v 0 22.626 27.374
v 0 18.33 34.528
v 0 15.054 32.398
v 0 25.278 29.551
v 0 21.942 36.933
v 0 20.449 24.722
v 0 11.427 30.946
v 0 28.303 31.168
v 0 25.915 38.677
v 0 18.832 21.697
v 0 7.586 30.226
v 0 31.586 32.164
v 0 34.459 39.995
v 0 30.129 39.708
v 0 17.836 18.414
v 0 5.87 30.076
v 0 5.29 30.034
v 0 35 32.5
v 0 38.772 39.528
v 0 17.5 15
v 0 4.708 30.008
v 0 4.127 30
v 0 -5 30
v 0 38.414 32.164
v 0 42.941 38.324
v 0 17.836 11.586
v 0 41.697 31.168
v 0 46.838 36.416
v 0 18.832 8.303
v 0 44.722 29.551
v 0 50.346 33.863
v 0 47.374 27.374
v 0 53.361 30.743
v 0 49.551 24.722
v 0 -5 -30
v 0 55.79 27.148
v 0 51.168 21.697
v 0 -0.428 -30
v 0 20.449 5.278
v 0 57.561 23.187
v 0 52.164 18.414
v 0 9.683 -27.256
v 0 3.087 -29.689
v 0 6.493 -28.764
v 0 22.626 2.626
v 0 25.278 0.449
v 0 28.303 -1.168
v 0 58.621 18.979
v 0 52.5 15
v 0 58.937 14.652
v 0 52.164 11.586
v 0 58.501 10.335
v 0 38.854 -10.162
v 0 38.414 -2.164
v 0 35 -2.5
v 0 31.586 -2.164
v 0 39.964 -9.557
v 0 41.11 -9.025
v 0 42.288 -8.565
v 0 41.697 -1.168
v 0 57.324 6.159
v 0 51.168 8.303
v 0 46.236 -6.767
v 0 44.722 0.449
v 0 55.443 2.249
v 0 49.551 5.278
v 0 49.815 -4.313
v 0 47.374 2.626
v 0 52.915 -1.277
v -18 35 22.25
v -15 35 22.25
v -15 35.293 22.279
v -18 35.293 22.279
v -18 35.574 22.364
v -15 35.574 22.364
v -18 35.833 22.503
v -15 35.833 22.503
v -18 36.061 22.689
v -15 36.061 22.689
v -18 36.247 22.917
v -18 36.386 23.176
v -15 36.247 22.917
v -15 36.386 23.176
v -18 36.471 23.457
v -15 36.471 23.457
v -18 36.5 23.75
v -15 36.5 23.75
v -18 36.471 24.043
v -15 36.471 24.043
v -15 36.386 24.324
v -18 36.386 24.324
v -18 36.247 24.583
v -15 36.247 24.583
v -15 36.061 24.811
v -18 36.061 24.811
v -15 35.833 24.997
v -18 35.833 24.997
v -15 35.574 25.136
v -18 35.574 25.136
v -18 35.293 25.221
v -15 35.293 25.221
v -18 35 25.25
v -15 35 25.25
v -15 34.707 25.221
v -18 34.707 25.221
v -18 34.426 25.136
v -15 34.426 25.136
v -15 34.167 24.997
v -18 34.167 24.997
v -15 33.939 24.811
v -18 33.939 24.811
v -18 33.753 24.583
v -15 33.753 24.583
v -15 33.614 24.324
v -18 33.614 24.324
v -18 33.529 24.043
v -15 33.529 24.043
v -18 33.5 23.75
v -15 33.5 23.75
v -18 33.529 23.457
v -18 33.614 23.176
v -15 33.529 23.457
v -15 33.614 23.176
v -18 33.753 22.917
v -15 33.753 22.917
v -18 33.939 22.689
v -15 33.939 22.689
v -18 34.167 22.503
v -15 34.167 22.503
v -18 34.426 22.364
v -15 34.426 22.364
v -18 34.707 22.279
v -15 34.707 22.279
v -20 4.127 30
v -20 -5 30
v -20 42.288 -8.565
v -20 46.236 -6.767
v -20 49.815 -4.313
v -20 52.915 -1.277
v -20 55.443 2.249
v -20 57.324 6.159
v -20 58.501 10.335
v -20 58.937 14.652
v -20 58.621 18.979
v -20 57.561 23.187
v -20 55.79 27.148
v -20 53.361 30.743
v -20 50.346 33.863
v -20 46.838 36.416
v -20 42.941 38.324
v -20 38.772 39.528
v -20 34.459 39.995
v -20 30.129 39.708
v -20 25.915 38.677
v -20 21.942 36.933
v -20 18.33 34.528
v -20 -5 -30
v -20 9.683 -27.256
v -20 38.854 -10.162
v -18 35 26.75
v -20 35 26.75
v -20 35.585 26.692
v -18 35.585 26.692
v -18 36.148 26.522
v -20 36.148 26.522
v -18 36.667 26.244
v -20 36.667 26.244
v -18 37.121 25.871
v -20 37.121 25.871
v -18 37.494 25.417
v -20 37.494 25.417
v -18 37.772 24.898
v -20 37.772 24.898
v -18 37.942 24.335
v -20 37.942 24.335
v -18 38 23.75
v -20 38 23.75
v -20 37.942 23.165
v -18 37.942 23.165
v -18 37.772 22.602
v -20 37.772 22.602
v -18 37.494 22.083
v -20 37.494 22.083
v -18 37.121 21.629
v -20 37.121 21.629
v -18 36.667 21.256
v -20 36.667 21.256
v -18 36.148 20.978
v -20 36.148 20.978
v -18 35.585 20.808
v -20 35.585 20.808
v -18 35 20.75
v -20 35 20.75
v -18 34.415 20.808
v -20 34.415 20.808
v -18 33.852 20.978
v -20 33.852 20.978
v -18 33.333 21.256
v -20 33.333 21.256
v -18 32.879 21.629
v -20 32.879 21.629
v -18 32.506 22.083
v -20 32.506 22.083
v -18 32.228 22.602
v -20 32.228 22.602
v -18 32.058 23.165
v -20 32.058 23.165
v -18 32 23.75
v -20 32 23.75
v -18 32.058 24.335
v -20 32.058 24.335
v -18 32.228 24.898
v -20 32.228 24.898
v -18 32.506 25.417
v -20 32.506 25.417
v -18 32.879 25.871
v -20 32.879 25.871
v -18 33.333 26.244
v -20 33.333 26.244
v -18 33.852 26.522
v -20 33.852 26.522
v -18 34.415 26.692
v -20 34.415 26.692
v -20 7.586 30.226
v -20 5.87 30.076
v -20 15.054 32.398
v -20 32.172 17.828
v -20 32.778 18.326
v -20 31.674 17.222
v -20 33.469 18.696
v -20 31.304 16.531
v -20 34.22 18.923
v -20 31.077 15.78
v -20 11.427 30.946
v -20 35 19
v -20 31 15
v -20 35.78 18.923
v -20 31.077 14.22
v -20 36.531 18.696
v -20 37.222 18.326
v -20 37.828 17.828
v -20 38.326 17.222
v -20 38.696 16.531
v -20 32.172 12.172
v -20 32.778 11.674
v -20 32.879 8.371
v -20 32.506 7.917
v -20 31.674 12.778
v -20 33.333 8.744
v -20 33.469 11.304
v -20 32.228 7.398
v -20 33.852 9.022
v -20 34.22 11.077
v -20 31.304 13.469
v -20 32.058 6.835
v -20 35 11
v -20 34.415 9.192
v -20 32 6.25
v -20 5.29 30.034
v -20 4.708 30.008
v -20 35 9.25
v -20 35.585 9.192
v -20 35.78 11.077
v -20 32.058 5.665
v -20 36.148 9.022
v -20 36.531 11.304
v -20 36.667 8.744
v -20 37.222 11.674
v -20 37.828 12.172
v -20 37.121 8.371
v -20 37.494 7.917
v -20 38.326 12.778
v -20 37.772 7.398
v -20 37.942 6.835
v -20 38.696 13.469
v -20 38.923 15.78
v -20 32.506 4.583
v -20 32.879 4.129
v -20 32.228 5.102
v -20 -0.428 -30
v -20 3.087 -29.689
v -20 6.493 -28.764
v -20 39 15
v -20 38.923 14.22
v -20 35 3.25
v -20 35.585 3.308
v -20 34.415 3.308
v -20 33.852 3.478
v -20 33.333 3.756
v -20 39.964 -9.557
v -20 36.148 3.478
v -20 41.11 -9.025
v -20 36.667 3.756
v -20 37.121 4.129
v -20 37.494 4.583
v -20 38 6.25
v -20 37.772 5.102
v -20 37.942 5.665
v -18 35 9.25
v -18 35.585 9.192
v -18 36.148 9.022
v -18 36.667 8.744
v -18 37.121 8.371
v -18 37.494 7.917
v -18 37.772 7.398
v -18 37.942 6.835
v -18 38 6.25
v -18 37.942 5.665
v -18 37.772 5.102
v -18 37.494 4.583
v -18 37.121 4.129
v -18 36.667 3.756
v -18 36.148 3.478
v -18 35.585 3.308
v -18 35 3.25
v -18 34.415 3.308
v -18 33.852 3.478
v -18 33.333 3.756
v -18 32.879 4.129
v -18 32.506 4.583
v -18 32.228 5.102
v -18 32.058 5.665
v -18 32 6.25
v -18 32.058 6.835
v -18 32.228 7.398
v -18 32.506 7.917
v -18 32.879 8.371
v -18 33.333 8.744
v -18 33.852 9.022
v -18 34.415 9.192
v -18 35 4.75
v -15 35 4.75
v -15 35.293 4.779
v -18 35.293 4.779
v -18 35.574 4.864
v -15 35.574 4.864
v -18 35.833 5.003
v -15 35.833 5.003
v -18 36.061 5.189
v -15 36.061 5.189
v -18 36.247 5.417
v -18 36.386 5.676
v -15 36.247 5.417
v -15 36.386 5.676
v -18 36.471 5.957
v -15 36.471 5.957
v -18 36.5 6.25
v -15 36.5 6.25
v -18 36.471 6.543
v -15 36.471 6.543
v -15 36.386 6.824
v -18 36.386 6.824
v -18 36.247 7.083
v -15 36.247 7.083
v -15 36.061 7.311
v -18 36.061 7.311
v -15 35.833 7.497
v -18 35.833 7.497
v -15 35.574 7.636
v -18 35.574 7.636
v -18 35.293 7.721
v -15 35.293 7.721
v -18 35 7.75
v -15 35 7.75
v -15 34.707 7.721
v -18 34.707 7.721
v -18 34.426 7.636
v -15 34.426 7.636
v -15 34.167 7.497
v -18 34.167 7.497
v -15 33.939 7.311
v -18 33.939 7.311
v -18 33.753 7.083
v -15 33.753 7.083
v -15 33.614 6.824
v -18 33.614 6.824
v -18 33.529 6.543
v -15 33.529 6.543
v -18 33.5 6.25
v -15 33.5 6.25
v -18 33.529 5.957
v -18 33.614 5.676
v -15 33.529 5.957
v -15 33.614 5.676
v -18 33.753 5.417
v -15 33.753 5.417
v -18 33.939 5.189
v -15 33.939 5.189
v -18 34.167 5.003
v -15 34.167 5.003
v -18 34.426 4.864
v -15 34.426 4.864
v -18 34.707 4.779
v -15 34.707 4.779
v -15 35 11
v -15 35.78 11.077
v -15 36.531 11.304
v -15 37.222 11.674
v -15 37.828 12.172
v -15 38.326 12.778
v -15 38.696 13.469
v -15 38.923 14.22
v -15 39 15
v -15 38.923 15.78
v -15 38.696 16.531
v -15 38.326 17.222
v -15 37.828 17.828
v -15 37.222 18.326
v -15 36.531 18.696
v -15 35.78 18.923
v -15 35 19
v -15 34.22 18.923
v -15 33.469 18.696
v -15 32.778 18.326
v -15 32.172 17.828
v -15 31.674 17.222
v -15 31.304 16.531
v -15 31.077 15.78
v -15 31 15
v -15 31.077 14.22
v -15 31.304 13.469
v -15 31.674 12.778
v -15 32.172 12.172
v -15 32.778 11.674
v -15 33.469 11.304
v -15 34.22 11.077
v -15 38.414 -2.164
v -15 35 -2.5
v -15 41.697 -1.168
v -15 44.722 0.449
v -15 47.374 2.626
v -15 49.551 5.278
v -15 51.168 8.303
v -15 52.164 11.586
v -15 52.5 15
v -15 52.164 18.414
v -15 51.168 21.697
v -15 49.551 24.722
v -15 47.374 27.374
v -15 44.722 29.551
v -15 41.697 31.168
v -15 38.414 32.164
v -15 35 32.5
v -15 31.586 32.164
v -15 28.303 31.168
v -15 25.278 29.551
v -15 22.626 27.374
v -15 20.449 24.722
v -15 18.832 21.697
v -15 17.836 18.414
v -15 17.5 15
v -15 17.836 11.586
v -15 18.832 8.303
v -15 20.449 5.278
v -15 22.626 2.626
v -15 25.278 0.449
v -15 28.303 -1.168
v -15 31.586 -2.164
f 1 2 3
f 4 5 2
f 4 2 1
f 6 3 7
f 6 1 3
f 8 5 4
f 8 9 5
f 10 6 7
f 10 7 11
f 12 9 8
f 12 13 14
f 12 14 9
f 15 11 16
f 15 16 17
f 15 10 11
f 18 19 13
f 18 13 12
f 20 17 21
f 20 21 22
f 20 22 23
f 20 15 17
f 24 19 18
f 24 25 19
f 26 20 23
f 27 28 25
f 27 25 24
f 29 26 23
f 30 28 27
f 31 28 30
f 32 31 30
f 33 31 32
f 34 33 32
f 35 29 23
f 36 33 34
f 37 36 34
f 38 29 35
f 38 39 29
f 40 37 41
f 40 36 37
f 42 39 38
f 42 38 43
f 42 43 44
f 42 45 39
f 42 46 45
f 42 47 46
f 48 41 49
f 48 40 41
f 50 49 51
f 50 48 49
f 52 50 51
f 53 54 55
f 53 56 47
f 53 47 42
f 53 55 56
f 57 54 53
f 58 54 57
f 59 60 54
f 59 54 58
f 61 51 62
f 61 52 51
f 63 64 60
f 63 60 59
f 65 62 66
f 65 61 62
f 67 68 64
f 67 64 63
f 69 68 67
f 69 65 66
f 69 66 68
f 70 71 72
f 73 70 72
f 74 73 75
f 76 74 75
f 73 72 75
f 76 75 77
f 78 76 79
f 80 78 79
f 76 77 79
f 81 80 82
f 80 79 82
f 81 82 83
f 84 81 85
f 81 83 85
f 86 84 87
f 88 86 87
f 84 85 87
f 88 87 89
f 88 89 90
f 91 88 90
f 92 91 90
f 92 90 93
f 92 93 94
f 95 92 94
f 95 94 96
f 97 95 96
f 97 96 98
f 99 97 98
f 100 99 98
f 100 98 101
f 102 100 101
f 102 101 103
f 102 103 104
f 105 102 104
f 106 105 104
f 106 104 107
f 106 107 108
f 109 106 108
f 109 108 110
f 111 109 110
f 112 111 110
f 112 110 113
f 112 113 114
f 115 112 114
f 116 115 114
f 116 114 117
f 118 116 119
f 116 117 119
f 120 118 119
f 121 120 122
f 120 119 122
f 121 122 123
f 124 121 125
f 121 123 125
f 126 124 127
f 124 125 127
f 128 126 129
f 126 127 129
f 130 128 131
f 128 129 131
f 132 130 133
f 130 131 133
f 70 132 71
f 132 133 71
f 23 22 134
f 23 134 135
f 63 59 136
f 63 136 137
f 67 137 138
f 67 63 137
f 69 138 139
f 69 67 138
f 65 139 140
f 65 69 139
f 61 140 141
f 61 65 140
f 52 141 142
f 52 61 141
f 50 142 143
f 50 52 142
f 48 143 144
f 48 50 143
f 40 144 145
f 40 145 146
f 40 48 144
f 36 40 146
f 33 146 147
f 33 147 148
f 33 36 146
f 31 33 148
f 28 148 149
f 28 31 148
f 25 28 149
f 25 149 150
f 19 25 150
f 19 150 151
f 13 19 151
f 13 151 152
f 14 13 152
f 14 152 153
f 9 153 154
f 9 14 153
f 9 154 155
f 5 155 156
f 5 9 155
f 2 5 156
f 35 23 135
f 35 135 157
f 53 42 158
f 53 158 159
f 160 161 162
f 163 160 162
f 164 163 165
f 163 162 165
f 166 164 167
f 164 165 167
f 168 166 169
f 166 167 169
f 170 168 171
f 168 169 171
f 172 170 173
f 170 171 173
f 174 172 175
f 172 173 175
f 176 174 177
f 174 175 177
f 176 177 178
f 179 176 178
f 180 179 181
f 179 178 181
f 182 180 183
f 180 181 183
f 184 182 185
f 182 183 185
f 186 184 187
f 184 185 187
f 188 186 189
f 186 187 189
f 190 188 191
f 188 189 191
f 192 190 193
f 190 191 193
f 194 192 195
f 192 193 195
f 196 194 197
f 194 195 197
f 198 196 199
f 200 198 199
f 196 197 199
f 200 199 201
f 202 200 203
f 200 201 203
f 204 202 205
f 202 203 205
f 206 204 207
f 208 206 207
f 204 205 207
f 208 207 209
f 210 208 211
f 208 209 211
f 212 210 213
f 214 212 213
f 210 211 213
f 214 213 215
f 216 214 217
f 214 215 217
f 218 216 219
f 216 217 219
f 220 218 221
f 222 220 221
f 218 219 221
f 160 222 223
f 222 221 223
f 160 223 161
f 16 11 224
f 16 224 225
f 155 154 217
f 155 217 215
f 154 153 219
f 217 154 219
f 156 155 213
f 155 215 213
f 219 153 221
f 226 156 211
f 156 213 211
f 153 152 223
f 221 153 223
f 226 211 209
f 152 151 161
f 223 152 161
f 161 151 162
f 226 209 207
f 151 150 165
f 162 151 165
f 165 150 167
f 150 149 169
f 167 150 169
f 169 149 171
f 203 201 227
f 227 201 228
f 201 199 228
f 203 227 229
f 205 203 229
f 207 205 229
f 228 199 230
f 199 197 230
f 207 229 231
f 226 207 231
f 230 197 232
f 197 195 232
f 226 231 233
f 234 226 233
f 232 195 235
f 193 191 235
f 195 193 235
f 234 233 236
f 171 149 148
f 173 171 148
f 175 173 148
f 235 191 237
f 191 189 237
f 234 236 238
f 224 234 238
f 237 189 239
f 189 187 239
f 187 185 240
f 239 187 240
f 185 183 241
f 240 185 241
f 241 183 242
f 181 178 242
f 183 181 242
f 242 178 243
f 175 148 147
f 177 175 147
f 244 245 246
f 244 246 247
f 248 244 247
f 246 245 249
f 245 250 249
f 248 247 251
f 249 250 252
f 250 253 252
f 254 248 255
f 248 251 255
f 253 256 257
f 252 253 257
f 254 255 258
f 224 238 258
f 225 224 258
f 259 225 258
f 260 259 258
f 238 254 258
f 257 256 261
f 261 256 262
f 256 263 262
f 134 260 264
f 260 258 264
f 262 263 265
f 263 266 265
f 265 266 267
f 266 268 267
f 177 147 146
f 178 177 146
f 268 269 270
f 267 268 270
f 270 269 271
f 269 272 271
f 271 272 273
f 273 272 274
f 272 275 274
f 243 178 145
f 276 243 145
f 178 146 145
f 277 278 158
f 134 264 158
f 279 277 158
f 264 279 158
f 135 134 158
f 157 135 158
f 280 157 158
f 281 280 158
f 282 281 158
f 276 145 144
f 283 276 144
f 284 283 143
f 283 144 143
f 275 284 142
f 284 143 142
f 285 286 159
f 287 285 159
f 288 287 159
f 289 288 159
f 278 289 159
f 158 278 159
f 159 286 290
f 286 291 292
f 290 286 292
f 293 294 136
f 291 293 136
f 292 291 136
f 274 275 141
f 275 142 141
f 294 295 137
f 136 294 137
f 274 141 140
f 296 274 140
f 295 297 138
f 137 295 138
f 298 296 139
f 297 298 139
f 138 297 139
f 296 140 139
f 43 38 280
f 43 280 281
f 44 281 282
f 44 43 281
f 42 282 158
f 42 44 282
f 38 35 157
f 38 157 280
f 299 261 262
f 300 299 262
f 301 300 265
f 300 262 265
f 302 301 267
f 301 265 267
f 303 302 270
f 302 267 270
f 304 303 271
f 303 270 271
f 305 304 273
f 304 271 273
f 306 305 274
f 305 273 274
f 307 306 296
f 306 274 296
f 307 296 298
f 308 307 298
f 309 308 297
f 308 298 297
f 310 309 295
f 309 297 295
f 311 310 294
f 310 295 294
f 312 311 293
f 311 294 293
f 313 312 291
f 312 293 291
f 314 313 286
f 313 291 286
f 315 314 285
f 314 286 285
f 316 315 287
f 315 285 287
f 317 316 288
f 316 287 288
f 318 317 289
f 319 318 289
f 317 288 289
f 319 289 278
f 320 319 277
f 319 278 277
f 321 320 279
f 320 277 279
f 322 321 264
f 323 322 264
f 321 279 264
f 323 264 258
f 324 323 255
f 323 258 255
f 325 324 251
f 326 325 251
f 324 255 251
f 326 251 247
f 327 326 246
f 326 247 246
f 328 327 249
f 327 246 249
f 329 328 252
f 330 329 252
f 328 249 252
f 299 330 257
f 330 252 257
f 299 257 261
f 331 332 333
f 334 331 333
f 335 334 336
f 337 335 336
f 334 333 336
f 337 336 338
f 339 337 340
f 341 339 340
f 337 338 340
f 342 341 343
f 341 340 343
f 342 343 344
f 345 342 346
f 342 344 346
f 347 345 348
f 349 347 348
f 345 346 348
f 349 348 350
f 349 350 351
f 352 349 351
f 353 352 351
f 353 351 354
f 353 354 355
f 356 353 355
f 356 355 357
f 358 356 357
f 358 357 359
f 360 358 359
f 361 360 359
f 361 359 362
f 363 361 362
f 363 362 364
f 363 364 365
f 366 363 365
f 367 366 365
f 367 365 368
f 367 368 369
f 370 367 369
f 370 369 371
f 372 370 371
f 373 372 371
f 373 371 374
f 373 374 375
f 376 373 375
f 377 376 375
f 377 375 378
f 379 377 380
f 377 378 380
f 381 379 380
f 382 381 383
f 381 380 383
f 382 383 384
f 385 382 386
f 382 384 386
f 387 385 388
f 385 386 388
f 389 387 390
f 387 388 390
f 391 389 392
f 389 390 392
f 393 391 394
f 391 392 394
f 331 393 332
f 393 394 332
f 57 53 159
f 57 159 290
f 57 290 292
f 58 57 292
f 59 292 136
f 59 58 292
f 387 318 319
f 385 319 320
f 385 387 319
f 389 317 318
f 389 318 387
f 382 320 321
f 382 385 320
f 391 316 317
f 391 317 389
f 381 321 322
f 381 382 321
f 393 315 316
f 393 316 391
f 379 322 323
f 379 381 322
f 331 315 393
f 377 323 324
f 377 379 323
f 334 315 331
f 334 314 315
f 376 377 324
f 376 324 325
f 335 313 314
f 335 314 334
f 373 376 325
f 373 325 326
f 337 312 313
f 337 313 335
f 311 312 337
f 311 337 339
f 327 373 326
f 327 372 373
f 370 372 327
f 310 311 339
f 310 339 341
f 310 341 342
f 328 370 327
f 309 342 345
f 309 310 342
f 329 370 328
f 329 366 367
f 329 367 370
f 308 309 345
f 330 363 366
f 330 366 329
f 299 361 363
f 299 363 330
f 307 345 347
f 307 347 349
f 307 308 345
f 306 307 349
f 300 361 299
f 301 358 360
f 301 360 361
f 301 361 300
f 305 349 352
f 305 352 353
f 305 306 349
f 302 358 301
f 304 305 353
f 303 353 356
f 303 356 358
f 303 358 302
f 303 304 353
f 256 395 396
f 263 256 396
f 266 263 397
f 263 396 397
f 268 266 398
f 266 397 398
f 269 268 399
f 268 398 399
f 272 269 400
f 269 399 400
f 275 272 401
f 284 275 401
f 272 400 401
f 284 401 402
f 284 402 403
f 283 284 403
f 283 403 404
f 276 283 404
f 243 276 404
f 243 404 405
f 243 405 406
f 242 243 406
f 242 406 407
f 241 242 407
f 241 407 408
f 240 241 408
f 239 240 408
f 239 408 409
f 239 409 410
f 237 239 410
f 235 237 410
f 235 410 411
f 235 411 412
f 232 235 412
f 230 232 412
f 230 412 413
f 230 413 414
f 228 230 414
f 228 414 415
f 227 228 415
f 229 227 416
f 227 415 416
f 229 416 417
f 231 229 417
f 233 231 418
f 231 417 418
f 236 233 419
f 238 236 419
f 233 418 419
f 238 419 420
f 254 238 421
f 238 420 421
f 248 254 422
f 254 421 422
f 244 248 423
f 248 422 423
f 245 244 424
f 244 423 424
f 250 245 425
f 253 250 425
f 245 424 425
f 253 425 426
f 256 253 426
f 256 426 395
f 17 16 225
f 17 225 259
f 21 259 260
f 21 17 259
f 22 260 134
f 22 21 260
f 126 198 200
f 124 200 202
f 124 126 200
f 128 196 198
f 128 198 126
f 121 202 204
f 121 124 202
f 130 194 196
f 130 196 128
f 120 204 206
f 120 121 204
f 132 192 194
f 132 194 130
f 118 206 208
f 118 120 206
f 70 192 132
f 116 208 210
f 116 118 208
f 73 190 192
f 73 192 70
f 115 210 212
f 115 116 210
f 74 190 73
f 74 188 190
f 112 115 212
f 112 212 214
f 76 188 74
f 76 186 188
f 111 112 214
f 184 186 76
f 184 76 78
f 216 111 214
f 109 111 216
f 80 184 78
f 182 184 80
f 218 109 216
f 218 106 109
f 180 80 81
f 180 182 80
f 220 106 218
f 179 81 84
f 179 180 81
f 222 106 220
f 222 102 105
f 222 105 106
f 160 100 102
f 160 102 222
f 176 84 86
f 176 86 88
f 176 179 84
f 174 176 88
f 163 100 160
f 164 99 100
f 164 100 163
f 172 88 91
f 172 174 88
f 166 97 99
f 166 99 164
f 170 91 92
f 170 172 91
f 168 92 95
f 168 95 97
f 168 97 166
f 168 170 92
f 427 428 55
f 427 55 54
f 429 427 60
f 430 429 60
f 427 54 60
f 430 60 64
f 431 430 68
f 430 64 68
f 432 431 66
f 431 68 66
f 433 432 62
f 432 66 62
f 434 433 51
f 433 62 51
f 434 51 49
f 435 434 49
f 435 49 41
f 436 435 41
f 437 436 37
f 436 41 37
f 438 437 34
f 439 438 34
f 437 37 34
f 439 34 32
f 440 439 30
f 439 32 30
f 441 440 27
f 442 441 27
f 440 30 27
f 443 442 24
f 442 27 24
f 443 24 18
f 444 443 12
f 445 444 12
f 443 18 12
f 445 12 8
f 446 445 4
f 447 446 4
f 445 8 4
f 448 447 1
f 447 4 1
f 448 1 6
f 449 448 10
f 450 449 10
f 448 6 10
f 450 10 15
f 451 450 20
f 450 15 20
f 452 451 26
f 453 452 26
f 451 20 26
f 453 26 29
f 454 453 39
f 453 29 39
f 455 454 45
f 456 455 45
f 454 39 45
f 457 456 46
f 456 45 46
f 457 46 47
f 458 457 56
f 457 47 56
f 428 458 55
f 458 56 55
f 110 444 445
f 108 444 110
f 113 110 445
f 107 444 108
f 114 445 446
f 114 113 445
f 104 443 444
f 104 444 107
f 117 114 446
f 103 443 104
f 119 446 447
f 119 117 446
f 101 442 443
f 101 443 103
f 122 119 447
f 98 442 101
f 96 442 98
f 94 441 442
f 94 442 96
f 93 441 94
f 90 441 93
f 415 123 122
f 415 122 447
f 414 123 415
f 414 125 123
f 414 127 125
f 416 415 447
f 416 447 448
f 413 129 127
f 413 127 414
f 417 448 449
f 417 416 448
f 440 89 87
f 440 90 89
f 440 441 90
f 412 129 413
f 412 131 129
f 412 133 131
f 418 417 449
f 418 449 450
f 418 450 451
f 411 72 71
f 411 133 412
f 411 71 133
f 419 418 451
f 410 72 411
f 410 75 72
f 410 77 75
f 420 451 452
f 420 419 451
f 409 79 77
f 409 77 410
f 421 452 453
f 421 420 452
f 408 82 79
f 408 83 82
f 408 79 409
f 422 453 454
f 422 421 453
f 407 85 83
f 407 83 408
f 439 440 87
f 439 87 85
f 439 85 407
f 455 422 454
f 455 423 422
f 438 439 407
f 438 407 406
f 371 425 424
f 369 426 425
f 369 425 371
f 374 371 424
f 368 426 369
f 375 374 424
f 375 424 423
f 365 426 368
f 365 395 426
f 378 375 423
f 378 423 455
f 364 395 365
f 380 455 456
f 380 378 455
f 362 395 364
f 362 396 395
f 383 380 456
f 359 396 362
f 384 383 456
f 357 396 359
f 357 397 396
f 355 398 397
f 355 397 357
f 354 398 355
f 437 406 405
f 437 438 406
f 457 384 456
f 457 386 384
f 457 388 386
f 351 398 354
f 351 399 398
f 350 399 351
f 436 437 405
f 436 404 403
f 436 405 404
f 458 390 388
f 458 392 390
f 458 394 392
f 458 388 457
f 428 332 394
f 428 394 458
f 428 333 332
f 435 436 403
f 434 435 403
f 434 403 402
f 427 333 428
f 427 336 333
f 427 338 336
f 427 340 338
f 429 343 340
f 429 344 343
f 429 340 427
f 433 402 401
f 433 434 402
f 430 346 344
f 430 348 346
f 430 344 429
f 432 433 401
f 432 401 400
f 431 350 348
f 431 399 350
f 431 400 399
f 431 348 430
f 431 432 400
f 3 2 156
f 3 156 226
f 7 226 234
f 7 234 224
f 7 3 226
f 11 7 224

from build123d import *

# Parameters (mm, degrees)
SALIENTE_EXTRUIR1_DEPTH = 20
CROQUIS5_R              = 17.5
CORTAR_EXTRUIR1_DEPTH   = 15
CROQUIS6_R              = 4
CROQUIS6_R_2            = 1.5
CORTAR_EXTRUIR2_DEPTH   = 6
CROQUIS7_R              = 3
CORTAR_EXTRUIR3_DEPTH   = 2


with BuildPart() as part:
    # Croquis3 → Saliente-Extruir1 (new body)
    with BuildSketch(Plane(origin=(0, 0, 0), x_dir=(0, 0, -1), z_dir=(1, 0, 0))):
        with BuildLine():
            Line((27.255557931, 9.68339194), (10.161648688, 38.854157713))
            ThreePointArc((10.161648688, 38.854157713), (9.28194474, 40.533010779), (8.565114788, 42.287599469))
            ThreePointArc((8.565114788, 42.287599469), (-27.147634239, 55.790109054), (-34.527859081, 18.330123878))
            ThreePointArc((-34.527859081, 18.330123878), (-31.582921761, 13.275948256), (-30.226287359, 7.585878825))
            Line((-30.226287359, 7.585878825), (-30.076141014, 5.870094713))
            ThreePointArc((-30.076141014, 5.870094713), (-30.019044321, 4.999168316), (-30, 4.126580134))
            Line((-30, 4.126580134), (-30, -5))
            Line((-30, -5), (30, -5))
            Line((30, -5), (30, -0.428270658))
            ThreePointArc((30, -0.428270658), (29.301698871, 4.810471624), (27.255557931, 9.68339194))
        make_face()
    extrude(amount=-SALIENTE_EXTRUIR1_DEPTH)

    # Croquis5 → Cortar-Extruir1 (cut)
    with BuildSketch(Plane(origin=(0, 0, 0), x_dir=(0, 0, -1), z_dir=(1, 0, 0))):
        with Locations((-15, 35)):
            Circle(CROQUIS5_R)
    extrude(amount=-CORTAR_EXTRUIR1_DEPTH, mode=Mode.SUBTRACT)

    # Croquis6 → Cortar-Extruir2 (cut)
    with BuildSketch(Plane(origin=(-15, 0, 0), x_dir=(0, 0, -1), z_dir=(1, 0, 0))):
        with Locations((-15, 35)):
            Circle(CROQUIS6_R)
        with Locations((-6.25, 35)):
            Circle(CROQUIS6_R_2)
        with Locations((-23.75, 35)):
            Circle(CROQUIS6_R_2)
    extrude(amount=-CORTAR_EXTRUIR2_DEPTH, mode=Mode.SUBTRACT)

    # Croquis7 → Cortar-Extruir3 (cut)
    with BuildSketch(Plane.ZY.offset(20)):
        with Locations((6.25, 35)):
            Circle(CROQUIS7_R)
        with Locations((23.75, 35)):
            Circle(CROQUIS7_R)
    extrude(amount=-CORTAR_EXTRUIR3_DEPTH, mode=Mode.SUBTRACT)


solid = part.part
